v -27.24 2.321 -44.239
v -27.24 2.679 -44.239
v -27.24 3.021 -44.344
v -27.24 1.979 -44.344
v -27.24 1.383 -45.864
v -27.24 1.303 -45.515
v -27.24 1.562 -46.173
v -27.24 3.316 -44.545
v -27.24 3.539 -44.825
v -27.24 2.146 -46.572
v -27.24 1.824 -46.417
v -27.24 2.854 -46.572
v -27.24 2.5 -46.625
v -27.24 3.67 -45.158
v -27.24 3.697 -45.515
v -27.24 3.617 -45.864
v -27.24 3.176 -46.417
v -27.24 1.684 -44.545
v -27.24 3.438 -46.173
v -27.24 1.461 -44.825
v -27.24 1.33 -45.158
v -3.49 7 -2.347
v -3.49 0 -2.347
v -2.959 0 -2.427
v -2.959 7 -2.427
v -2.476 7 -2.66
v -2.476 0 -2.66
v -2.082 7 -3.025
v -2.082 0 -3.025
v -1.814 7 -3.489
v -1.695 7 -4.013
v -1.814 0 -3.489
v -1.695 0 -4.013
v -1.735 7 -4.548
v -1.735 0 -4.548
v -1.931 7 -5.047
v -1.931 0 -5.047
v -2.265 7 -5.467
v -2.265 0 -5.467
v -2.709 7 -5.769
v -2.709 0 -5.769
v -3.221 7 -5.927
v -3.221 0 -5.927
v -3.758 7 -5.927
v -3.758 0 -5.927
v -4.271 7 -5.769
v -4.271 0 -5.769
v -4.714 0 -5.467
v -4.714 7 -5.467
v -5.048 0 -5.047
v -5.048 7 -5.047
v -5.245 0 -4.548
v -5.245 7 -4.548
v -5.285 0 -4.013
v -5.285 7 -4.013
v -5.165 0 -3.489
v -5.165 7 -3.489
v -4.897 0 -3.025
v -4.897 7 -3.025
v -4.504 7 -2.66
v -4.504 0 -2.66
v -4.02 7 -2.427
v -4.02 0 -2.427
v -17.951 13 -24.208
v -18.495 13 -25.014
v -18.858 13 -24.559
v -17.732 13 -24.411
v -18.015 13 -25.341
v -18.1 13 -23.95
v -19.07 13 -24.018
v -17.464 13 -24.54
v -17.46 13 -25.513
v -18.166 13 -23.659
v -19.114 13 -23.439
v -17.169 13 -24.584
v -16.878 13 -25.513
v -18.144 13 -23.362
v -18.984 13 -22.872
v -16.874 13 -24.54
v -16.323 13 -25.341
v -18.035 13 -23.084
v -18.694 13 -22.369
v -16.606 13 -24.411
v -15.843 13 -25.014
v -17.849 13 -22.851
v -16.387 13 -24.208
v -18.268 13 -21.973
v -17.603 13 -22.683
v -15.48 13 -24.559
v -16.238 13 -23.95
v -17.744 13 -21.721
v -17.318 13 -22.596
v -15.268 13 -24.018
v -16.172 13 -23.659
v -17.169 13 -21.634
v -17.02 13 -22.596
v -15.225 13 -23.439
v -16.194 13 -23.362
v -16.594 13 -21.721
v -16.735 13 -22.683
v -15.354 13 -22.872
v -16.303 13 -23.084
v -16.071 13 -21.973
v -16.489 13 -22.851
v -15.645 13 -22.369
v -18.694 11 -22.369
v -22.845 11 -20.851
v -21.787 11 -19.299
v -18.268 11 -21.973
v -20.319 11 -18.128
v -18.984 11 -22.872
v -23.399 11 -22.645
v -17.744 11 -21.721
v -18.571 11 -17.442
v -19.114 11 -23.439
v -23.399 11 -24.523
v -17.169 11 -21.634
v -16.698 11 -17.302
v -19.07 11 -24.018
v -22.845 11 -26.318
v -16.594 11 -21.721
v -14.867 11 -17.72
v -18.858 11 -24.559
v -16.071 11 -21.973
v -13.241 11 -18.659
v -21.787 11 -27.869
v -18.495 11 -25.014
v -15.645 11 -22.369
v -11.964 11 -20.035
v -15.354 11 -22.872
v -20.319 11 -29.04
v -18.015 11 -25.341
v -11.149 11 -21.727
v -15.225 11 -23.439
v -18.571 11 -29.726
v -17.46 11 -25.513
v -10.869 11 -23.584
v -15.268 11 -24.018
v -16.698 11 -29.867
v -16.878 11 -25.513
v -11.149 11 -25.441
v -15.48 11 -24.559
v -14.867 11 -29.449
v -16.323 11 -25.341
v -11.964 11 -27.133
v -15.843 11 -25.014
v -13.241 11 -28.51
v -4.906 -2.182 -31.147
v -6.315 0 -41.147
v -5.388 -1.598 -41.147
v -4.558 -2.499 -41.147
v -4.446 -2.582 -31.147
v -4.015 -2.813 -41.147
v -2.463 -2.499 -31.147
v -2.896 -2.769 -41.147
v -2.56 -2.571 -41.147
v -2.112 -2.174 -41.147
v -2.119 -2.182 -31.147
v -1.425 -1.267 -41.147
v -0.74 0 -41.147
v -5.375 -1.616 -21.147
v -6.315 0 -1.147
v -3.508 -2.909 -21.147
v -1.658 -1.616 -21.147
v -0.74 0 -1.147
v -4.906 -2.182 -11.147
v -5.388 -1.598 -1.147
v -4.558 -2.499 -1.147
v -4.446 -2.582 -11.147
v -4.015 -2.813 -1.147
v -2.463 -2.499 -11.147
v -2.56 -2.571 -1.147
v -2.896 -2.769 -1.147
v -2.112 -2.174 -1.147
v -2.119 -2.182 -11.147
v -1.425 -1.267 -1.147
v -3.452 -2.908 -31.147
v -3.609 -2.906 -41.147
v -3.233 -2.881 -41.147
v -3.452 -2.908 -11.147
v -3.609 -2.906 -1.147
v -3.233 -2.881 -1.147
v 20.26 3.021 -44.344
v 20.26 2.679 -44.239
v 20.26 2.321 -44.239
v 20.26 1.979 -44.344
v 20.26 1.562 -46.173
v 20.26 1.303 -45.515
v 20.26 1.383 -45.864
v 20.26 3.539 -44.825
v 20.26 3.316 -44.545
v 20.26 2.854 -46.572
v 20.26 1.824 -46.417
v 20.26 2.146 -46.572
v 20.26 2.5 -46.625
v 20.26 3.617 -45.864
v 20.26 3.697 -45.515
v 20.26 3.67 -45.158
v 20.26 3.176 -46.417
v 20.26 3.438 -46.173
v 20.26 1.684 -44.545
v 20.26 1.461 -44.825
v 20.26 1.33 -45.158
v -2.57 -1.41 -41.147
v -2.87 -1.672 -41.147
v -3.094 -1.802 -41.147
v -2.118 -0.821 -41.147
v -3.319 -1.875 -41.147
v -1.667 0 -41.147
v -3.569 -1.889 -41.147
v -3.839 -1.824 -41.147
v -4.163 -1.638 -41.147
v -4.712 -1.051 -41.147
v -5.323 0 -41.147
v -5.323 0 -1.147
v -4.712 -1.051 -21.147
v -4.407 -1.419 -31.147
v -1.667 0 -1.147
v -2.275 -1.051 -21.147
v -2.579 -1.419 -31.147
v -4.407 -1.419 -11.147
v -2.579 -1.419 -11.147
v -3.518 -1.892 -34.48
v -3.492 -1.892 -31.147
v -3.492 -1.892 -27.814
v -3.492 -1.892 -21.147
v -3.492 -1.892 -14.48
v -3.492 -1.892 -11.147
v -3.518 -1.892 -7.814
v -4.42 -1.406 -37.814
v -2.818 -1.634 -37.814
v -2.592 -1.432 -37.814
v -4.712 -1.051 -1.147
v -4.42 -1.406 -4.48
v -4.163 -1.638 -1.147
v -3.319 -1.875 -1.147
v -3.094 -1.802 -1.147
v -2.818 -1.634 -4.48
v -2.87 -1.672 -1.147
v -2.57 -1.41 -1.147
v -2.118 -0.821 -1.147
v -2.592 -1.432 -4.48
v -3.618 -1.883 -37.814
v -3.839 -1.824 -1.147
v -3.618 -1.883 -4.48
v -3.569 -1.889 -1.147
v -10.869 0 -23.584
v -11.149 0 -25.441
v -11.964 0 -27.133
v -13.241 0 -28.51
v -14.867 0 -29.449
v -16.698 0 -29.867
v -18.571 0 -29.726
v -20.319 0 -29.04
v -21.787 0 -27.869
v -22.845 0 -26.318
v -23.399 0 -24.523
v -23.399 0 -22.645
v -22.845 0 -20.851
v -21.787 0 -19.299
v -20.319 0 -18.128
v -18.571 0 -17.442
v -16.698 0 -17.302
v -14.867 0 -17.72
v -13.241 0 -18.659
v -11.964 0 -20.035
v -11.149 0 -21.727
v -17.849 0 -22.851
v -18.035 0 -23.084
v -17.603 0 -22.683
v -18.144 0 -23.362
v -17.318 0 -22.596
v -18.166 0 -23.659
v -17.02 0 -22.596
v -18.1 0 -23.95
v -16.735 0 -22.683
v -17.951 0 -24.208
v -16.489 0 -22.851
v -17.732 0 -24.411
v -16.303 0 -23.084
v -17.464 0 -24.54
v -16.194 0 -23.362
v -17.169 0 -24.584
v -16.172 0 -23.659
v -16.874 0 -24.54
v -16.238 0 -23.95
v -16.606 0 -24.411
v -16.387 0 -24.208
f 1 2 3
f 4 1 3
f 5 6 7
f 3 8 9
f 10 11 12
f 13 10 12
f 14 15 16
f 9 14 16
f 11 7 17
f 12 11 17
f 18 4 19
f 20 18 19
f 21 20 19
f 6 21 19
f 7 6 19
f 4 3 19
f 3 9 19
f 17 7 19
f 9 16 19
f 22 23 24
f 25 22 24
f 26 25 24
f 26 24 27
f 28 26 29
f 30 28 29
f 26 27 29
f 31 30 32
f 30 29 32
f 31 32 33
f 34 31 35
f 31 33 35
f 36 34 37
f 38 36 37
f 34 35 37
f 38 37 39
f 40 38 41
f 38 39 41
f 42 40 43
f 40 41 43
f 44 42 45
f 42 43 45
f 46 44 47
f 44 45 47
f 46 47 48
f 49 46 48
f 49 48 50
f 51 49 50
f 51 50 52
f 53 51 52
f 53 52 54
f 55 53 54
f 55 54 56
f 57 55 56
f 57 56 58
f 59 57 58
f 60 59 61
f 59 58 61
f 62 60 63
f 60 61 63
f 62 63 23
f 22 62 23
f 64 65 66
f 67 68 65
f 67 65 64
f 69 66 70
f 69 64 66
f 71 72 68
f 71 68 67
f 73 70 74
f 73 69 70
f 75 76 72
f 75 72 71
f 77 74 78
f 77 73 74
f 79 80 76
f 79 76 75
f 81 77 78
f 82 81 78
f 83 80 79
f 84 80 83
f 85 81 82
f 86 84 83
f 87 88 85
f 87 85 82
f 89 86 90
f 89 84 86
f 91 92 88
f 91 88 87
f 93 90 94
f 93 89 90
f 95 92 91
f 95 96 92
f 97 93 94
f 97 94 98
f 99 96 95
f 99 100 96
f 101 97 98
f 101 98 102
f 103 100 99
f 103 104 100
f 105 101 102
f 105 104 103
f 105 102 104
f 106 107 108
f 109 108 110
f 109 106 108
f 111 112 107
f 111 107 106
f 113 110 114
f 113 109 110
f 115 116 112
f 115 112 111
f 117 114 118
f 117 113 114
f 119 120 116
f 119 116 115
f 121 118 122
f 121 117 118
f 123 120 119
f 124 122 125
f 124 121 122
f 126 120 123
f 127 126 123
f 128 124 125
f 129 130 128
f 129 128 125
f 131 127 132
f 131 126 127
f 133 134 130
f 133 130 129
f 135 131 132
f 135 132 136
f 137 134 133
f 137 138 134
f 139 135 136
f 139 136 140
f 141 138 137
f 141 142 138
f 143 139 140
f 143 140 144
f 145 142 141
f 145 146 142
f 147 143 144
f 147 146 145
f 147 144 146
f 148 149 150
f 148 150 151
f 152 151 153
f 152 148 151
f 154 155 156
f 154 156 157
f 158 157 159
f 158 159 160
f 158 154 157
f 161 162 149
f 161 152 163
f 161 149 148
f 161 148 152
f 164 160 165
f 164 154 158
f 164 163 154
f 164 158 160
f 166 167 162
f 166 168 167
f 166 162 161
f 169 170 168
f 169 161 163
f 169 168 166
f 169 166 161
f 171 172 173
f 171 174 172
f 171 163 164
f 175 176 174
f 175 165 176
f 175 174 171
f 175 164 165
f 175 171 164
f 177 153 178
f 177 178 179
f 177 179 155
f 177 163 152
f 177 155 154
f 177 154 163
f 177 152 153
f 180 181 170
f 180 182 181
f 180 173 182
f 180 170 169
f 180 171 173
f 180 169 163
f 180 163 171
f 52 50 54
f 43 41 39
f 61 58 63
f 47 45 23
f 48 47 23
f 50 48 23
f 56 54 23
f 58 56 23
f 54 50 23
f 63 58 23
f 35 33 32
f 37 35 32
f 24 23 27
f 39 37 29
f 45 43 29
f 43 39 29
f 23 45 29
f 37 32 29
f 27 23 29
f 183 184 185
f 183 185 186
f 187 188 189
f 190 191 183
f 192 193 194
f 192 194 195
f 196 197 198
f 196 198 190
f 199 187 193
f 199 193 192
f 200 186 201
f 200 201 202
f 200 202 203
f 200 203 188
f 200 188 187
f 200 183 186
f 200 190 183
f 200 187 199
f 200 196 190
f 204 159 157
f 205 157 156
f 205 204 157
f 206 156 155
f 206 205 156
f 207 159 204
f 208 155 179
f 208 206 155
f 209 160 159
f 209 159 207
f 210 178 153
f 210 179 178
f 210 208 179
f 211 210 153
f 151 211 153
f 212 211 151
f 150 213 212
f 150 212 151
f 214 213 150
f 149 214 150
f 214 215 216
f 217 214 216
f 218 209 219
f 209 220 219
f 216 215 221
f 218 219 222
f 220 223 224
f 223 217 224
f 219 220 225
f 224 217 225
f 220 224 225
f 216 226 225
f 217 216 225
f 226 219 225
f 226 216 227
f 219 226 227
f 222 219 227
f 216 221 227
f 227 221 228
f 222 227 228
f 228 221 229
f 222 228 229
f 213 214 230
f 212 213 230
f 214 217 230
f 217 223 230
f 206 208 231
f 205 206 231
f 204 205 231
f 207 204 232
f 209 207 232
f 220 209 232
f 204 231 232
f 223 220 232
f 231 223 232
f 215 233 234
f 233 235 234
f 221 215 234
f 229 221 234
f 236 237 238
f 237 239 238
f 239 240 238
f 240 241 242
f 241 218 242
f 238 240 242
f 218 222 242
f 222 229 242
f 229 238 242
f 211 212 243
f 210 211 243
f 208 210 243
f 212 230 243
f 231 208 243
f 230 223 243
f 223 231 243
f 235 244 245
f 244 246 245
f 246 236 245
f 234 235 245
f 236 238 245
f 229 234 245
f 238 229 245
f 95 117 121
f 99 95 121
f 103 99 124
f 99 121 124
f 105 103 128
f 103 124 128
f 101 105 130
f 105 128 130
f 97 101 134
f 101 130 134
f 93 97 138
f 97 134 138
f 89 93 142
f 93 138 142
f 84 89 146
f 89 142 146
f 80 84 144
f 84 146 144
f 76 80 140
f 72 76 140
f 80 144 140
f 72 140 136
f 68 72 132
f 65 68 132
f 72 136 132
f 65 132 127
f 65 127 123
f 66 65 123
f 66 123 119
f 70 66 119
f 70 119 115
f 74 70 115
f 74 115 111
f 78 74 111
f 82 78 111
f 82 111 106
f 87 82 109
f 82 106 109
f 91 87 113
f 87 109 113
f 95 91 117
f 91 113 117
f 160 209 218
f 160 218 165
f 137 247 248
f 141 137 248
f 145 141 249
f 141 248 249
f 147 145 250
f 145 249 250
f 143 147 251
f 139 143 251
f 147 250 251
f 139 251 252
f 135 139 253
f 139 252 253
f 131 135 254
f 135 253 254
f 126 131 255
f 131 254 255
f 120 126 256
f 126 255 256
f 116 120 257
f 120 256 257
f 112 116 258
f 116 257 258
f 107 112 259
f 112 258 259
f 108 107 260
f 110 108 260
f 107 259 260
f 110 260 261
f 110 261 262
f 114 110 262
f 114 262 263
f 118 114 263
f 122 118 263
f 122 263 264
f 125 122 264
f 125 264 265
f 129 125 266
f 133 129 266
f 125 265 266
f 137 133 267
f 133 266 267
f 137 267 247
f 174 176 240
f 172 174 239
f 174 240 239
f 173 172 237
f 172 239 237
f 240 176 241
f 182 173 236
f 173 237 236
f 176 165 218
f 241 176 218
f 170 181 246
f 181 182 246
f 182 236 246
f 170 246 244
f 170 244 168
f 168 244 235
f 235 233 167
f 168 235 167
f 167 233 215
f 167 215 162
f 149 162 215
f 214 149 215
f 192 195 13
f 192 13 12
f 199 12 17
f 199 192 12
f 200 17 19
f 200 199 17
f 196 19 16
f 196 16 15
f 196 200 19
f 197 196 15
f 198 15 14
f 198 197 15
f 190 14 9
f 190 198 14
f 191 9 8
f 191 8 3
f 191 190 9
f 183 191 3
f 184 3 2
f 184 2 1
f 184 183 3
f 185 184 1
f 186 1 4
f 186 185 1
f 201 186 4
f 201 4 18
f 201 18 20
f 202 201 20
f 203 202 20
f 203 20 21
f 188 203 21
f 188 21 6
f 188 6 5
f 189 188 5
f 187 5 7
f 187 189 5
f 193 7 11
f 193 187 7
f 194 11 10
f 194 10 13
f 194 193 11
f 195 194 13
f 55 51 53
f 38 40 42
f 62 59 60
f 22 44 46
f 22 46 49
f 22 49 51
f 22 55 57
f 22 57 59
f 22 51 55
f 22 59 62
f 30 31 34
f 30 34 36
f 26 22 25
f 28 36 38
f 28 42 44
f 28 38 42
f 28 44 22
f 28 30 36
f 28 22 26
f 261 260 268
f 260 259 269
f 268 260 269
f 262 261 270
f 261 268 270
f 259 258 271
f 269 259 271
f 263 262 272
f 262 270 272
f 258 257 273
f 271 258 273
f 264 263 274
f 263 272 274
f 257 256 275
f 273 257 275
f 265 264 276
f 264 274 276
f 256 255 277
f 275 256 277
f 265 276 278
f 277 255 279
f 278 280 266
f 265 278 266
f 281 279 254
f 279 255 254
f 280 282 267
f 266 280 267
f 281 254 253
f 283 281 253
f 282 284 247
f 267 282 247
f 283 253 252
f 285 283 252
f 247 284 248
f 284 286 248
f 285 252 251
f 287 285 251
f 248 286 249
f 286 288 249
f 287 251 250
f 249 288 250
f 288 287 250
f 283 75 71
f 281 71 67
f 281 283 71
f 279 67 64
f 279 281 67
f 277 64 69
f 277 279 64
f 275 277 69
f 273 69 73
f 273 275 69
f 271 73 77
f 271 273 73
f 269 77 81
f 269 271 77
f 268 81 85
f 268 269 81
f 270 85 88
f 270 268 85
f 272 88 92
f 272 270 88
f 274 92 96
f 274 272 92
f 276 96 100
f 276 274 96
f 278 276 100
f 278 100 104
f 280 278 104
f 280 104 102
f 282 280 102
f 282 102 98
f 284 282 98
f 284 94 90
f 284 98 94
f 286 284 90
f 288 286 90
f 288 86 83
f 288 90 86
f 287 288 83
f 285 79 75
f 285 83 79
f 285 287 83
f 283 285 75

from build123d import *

# Parameters (mm, degrees)
BOSS_EXTRUDE3_OUTLINE_R = 6.3
BOSS_EXTRUDE3_DEPTH     = 11
SKETCH4_R               = 1.95
BOSS_EXTRUDE8_DEPTH     = 2
SKETCH11_R              = 1
CUT_EXTRUDE3_DEPTH      = 41.160605774
SKETCH7_R               = 1.2
BOSS_EXTRUDE10_DEPTH    = 47.5
BOSS_EXTRUDE14_DEPTH    = 40
SKETCH17_R              = 1.8
BOSS_EXTRUDE15_DEPTH    = 7


# Read off the part's stored shape, not the designer's step: Boss-Extrude3
with BuildPart() as part:
    # Boss-Extrude3 outline → Boss-Extrude3 (new body)
    with BuildSketch(Plane(origin=(0, 0, 0), x_dir=(1, 0, 0), z_dir=(0, 1, 0))):
        with Locations((-17.169079115, 23.584386921)):
            Circle(BOSS_EXTRUDE3_OUTLINE_R)
    extrude(amount=BOSS_EXTRUDE3_DEPTH)

    # Sketch4 → Boss-Extrude8 (add)
    with BuildSketch(Plane(origin=(0, 11, 0), x_dir=(1, 0, 0), z_dir=(0, 1, 0))):
        with Locations(Location((-17.169079115, 23.584386921, 0), (0, 0, 270))):
            Circle(SKETCH4_R)
    extrude(amount=BOSS_EXTRUDE8_DEPTH)

    # Sketch11 → Cut-Extrude3 (cut, through all)
    with BuildSketch(Plane(origin=(0, 0, 0), x_dir=(1, 0, 0), z_dir=(0, 1, 0))):
        with Locations(Location((-17.169079115, 23.584386921, 0), (0, 0, 90))):
            Circle(SKETCH11_R)
    extrude(amount=CUT_EXTRUDE3_DEPTH, mode=Mode.SUBTRACT)


with BuildPart() as body_2:
    # Sketch7 → Boss-Extrude10 (new body)
    with BuildSketch(Plane(origin=(20.260349504, 0, 0), x_dir=(0, 0, -1), z_dir=(1, 0, 0))):
        with Locations((45.425113589, 2.5)):
            Circle(SKETCH7_R)
    extrude(amount=-BOSS_EXTRUDE10_DEPTH)


with BuildPart() as body_3:
    # Sketch13 → Boss-Extrude14 (new body)
    with BuildSketch(Plane.XY.offset(-1.147113589)):
        with BuildLine():
            Line((-6.31477114, 0), (-5.323418525, 0))
            add(Edge.make_bspline(
                [(-5.323418525, 0), (-3.489459234, -3.784444713), (-1.667001085, 0)],
                knots=[0, 0, 0, 1, 1, 1], degree=2))
            Line((-1.667001085, 0), (-0.740022016, 0))
            add(Edge.make_bspline(
                [(-6.31477114, 0), (-3.488031914, -5.818885026), (-0.740022016, 0)],
                knots=[0, 0, 0, 1, 1, 1], degree=2))
        make_face()
    extrude(amount=-BOSS_EXTRUDE14_DEPTH)


with BuildPart() as body_4:
    # Sketch17 → Boss-Extrude15 (new body)
    with BuildSketch(Plane(origin=(0, 0, 0), x_dir=(1, 0, 0), z_dir=(0, 1, 0))):
        with Locations(Location((-3.489650496, 4.147113589, 0), (0, 0, 270))):
            Circle(SKETCH17_R)
    extrude(amount=BOSS_EXTRUDE15_DEPTH)


solid = Compound([part.part, body_2.part, body_3.part, body_4.part])
